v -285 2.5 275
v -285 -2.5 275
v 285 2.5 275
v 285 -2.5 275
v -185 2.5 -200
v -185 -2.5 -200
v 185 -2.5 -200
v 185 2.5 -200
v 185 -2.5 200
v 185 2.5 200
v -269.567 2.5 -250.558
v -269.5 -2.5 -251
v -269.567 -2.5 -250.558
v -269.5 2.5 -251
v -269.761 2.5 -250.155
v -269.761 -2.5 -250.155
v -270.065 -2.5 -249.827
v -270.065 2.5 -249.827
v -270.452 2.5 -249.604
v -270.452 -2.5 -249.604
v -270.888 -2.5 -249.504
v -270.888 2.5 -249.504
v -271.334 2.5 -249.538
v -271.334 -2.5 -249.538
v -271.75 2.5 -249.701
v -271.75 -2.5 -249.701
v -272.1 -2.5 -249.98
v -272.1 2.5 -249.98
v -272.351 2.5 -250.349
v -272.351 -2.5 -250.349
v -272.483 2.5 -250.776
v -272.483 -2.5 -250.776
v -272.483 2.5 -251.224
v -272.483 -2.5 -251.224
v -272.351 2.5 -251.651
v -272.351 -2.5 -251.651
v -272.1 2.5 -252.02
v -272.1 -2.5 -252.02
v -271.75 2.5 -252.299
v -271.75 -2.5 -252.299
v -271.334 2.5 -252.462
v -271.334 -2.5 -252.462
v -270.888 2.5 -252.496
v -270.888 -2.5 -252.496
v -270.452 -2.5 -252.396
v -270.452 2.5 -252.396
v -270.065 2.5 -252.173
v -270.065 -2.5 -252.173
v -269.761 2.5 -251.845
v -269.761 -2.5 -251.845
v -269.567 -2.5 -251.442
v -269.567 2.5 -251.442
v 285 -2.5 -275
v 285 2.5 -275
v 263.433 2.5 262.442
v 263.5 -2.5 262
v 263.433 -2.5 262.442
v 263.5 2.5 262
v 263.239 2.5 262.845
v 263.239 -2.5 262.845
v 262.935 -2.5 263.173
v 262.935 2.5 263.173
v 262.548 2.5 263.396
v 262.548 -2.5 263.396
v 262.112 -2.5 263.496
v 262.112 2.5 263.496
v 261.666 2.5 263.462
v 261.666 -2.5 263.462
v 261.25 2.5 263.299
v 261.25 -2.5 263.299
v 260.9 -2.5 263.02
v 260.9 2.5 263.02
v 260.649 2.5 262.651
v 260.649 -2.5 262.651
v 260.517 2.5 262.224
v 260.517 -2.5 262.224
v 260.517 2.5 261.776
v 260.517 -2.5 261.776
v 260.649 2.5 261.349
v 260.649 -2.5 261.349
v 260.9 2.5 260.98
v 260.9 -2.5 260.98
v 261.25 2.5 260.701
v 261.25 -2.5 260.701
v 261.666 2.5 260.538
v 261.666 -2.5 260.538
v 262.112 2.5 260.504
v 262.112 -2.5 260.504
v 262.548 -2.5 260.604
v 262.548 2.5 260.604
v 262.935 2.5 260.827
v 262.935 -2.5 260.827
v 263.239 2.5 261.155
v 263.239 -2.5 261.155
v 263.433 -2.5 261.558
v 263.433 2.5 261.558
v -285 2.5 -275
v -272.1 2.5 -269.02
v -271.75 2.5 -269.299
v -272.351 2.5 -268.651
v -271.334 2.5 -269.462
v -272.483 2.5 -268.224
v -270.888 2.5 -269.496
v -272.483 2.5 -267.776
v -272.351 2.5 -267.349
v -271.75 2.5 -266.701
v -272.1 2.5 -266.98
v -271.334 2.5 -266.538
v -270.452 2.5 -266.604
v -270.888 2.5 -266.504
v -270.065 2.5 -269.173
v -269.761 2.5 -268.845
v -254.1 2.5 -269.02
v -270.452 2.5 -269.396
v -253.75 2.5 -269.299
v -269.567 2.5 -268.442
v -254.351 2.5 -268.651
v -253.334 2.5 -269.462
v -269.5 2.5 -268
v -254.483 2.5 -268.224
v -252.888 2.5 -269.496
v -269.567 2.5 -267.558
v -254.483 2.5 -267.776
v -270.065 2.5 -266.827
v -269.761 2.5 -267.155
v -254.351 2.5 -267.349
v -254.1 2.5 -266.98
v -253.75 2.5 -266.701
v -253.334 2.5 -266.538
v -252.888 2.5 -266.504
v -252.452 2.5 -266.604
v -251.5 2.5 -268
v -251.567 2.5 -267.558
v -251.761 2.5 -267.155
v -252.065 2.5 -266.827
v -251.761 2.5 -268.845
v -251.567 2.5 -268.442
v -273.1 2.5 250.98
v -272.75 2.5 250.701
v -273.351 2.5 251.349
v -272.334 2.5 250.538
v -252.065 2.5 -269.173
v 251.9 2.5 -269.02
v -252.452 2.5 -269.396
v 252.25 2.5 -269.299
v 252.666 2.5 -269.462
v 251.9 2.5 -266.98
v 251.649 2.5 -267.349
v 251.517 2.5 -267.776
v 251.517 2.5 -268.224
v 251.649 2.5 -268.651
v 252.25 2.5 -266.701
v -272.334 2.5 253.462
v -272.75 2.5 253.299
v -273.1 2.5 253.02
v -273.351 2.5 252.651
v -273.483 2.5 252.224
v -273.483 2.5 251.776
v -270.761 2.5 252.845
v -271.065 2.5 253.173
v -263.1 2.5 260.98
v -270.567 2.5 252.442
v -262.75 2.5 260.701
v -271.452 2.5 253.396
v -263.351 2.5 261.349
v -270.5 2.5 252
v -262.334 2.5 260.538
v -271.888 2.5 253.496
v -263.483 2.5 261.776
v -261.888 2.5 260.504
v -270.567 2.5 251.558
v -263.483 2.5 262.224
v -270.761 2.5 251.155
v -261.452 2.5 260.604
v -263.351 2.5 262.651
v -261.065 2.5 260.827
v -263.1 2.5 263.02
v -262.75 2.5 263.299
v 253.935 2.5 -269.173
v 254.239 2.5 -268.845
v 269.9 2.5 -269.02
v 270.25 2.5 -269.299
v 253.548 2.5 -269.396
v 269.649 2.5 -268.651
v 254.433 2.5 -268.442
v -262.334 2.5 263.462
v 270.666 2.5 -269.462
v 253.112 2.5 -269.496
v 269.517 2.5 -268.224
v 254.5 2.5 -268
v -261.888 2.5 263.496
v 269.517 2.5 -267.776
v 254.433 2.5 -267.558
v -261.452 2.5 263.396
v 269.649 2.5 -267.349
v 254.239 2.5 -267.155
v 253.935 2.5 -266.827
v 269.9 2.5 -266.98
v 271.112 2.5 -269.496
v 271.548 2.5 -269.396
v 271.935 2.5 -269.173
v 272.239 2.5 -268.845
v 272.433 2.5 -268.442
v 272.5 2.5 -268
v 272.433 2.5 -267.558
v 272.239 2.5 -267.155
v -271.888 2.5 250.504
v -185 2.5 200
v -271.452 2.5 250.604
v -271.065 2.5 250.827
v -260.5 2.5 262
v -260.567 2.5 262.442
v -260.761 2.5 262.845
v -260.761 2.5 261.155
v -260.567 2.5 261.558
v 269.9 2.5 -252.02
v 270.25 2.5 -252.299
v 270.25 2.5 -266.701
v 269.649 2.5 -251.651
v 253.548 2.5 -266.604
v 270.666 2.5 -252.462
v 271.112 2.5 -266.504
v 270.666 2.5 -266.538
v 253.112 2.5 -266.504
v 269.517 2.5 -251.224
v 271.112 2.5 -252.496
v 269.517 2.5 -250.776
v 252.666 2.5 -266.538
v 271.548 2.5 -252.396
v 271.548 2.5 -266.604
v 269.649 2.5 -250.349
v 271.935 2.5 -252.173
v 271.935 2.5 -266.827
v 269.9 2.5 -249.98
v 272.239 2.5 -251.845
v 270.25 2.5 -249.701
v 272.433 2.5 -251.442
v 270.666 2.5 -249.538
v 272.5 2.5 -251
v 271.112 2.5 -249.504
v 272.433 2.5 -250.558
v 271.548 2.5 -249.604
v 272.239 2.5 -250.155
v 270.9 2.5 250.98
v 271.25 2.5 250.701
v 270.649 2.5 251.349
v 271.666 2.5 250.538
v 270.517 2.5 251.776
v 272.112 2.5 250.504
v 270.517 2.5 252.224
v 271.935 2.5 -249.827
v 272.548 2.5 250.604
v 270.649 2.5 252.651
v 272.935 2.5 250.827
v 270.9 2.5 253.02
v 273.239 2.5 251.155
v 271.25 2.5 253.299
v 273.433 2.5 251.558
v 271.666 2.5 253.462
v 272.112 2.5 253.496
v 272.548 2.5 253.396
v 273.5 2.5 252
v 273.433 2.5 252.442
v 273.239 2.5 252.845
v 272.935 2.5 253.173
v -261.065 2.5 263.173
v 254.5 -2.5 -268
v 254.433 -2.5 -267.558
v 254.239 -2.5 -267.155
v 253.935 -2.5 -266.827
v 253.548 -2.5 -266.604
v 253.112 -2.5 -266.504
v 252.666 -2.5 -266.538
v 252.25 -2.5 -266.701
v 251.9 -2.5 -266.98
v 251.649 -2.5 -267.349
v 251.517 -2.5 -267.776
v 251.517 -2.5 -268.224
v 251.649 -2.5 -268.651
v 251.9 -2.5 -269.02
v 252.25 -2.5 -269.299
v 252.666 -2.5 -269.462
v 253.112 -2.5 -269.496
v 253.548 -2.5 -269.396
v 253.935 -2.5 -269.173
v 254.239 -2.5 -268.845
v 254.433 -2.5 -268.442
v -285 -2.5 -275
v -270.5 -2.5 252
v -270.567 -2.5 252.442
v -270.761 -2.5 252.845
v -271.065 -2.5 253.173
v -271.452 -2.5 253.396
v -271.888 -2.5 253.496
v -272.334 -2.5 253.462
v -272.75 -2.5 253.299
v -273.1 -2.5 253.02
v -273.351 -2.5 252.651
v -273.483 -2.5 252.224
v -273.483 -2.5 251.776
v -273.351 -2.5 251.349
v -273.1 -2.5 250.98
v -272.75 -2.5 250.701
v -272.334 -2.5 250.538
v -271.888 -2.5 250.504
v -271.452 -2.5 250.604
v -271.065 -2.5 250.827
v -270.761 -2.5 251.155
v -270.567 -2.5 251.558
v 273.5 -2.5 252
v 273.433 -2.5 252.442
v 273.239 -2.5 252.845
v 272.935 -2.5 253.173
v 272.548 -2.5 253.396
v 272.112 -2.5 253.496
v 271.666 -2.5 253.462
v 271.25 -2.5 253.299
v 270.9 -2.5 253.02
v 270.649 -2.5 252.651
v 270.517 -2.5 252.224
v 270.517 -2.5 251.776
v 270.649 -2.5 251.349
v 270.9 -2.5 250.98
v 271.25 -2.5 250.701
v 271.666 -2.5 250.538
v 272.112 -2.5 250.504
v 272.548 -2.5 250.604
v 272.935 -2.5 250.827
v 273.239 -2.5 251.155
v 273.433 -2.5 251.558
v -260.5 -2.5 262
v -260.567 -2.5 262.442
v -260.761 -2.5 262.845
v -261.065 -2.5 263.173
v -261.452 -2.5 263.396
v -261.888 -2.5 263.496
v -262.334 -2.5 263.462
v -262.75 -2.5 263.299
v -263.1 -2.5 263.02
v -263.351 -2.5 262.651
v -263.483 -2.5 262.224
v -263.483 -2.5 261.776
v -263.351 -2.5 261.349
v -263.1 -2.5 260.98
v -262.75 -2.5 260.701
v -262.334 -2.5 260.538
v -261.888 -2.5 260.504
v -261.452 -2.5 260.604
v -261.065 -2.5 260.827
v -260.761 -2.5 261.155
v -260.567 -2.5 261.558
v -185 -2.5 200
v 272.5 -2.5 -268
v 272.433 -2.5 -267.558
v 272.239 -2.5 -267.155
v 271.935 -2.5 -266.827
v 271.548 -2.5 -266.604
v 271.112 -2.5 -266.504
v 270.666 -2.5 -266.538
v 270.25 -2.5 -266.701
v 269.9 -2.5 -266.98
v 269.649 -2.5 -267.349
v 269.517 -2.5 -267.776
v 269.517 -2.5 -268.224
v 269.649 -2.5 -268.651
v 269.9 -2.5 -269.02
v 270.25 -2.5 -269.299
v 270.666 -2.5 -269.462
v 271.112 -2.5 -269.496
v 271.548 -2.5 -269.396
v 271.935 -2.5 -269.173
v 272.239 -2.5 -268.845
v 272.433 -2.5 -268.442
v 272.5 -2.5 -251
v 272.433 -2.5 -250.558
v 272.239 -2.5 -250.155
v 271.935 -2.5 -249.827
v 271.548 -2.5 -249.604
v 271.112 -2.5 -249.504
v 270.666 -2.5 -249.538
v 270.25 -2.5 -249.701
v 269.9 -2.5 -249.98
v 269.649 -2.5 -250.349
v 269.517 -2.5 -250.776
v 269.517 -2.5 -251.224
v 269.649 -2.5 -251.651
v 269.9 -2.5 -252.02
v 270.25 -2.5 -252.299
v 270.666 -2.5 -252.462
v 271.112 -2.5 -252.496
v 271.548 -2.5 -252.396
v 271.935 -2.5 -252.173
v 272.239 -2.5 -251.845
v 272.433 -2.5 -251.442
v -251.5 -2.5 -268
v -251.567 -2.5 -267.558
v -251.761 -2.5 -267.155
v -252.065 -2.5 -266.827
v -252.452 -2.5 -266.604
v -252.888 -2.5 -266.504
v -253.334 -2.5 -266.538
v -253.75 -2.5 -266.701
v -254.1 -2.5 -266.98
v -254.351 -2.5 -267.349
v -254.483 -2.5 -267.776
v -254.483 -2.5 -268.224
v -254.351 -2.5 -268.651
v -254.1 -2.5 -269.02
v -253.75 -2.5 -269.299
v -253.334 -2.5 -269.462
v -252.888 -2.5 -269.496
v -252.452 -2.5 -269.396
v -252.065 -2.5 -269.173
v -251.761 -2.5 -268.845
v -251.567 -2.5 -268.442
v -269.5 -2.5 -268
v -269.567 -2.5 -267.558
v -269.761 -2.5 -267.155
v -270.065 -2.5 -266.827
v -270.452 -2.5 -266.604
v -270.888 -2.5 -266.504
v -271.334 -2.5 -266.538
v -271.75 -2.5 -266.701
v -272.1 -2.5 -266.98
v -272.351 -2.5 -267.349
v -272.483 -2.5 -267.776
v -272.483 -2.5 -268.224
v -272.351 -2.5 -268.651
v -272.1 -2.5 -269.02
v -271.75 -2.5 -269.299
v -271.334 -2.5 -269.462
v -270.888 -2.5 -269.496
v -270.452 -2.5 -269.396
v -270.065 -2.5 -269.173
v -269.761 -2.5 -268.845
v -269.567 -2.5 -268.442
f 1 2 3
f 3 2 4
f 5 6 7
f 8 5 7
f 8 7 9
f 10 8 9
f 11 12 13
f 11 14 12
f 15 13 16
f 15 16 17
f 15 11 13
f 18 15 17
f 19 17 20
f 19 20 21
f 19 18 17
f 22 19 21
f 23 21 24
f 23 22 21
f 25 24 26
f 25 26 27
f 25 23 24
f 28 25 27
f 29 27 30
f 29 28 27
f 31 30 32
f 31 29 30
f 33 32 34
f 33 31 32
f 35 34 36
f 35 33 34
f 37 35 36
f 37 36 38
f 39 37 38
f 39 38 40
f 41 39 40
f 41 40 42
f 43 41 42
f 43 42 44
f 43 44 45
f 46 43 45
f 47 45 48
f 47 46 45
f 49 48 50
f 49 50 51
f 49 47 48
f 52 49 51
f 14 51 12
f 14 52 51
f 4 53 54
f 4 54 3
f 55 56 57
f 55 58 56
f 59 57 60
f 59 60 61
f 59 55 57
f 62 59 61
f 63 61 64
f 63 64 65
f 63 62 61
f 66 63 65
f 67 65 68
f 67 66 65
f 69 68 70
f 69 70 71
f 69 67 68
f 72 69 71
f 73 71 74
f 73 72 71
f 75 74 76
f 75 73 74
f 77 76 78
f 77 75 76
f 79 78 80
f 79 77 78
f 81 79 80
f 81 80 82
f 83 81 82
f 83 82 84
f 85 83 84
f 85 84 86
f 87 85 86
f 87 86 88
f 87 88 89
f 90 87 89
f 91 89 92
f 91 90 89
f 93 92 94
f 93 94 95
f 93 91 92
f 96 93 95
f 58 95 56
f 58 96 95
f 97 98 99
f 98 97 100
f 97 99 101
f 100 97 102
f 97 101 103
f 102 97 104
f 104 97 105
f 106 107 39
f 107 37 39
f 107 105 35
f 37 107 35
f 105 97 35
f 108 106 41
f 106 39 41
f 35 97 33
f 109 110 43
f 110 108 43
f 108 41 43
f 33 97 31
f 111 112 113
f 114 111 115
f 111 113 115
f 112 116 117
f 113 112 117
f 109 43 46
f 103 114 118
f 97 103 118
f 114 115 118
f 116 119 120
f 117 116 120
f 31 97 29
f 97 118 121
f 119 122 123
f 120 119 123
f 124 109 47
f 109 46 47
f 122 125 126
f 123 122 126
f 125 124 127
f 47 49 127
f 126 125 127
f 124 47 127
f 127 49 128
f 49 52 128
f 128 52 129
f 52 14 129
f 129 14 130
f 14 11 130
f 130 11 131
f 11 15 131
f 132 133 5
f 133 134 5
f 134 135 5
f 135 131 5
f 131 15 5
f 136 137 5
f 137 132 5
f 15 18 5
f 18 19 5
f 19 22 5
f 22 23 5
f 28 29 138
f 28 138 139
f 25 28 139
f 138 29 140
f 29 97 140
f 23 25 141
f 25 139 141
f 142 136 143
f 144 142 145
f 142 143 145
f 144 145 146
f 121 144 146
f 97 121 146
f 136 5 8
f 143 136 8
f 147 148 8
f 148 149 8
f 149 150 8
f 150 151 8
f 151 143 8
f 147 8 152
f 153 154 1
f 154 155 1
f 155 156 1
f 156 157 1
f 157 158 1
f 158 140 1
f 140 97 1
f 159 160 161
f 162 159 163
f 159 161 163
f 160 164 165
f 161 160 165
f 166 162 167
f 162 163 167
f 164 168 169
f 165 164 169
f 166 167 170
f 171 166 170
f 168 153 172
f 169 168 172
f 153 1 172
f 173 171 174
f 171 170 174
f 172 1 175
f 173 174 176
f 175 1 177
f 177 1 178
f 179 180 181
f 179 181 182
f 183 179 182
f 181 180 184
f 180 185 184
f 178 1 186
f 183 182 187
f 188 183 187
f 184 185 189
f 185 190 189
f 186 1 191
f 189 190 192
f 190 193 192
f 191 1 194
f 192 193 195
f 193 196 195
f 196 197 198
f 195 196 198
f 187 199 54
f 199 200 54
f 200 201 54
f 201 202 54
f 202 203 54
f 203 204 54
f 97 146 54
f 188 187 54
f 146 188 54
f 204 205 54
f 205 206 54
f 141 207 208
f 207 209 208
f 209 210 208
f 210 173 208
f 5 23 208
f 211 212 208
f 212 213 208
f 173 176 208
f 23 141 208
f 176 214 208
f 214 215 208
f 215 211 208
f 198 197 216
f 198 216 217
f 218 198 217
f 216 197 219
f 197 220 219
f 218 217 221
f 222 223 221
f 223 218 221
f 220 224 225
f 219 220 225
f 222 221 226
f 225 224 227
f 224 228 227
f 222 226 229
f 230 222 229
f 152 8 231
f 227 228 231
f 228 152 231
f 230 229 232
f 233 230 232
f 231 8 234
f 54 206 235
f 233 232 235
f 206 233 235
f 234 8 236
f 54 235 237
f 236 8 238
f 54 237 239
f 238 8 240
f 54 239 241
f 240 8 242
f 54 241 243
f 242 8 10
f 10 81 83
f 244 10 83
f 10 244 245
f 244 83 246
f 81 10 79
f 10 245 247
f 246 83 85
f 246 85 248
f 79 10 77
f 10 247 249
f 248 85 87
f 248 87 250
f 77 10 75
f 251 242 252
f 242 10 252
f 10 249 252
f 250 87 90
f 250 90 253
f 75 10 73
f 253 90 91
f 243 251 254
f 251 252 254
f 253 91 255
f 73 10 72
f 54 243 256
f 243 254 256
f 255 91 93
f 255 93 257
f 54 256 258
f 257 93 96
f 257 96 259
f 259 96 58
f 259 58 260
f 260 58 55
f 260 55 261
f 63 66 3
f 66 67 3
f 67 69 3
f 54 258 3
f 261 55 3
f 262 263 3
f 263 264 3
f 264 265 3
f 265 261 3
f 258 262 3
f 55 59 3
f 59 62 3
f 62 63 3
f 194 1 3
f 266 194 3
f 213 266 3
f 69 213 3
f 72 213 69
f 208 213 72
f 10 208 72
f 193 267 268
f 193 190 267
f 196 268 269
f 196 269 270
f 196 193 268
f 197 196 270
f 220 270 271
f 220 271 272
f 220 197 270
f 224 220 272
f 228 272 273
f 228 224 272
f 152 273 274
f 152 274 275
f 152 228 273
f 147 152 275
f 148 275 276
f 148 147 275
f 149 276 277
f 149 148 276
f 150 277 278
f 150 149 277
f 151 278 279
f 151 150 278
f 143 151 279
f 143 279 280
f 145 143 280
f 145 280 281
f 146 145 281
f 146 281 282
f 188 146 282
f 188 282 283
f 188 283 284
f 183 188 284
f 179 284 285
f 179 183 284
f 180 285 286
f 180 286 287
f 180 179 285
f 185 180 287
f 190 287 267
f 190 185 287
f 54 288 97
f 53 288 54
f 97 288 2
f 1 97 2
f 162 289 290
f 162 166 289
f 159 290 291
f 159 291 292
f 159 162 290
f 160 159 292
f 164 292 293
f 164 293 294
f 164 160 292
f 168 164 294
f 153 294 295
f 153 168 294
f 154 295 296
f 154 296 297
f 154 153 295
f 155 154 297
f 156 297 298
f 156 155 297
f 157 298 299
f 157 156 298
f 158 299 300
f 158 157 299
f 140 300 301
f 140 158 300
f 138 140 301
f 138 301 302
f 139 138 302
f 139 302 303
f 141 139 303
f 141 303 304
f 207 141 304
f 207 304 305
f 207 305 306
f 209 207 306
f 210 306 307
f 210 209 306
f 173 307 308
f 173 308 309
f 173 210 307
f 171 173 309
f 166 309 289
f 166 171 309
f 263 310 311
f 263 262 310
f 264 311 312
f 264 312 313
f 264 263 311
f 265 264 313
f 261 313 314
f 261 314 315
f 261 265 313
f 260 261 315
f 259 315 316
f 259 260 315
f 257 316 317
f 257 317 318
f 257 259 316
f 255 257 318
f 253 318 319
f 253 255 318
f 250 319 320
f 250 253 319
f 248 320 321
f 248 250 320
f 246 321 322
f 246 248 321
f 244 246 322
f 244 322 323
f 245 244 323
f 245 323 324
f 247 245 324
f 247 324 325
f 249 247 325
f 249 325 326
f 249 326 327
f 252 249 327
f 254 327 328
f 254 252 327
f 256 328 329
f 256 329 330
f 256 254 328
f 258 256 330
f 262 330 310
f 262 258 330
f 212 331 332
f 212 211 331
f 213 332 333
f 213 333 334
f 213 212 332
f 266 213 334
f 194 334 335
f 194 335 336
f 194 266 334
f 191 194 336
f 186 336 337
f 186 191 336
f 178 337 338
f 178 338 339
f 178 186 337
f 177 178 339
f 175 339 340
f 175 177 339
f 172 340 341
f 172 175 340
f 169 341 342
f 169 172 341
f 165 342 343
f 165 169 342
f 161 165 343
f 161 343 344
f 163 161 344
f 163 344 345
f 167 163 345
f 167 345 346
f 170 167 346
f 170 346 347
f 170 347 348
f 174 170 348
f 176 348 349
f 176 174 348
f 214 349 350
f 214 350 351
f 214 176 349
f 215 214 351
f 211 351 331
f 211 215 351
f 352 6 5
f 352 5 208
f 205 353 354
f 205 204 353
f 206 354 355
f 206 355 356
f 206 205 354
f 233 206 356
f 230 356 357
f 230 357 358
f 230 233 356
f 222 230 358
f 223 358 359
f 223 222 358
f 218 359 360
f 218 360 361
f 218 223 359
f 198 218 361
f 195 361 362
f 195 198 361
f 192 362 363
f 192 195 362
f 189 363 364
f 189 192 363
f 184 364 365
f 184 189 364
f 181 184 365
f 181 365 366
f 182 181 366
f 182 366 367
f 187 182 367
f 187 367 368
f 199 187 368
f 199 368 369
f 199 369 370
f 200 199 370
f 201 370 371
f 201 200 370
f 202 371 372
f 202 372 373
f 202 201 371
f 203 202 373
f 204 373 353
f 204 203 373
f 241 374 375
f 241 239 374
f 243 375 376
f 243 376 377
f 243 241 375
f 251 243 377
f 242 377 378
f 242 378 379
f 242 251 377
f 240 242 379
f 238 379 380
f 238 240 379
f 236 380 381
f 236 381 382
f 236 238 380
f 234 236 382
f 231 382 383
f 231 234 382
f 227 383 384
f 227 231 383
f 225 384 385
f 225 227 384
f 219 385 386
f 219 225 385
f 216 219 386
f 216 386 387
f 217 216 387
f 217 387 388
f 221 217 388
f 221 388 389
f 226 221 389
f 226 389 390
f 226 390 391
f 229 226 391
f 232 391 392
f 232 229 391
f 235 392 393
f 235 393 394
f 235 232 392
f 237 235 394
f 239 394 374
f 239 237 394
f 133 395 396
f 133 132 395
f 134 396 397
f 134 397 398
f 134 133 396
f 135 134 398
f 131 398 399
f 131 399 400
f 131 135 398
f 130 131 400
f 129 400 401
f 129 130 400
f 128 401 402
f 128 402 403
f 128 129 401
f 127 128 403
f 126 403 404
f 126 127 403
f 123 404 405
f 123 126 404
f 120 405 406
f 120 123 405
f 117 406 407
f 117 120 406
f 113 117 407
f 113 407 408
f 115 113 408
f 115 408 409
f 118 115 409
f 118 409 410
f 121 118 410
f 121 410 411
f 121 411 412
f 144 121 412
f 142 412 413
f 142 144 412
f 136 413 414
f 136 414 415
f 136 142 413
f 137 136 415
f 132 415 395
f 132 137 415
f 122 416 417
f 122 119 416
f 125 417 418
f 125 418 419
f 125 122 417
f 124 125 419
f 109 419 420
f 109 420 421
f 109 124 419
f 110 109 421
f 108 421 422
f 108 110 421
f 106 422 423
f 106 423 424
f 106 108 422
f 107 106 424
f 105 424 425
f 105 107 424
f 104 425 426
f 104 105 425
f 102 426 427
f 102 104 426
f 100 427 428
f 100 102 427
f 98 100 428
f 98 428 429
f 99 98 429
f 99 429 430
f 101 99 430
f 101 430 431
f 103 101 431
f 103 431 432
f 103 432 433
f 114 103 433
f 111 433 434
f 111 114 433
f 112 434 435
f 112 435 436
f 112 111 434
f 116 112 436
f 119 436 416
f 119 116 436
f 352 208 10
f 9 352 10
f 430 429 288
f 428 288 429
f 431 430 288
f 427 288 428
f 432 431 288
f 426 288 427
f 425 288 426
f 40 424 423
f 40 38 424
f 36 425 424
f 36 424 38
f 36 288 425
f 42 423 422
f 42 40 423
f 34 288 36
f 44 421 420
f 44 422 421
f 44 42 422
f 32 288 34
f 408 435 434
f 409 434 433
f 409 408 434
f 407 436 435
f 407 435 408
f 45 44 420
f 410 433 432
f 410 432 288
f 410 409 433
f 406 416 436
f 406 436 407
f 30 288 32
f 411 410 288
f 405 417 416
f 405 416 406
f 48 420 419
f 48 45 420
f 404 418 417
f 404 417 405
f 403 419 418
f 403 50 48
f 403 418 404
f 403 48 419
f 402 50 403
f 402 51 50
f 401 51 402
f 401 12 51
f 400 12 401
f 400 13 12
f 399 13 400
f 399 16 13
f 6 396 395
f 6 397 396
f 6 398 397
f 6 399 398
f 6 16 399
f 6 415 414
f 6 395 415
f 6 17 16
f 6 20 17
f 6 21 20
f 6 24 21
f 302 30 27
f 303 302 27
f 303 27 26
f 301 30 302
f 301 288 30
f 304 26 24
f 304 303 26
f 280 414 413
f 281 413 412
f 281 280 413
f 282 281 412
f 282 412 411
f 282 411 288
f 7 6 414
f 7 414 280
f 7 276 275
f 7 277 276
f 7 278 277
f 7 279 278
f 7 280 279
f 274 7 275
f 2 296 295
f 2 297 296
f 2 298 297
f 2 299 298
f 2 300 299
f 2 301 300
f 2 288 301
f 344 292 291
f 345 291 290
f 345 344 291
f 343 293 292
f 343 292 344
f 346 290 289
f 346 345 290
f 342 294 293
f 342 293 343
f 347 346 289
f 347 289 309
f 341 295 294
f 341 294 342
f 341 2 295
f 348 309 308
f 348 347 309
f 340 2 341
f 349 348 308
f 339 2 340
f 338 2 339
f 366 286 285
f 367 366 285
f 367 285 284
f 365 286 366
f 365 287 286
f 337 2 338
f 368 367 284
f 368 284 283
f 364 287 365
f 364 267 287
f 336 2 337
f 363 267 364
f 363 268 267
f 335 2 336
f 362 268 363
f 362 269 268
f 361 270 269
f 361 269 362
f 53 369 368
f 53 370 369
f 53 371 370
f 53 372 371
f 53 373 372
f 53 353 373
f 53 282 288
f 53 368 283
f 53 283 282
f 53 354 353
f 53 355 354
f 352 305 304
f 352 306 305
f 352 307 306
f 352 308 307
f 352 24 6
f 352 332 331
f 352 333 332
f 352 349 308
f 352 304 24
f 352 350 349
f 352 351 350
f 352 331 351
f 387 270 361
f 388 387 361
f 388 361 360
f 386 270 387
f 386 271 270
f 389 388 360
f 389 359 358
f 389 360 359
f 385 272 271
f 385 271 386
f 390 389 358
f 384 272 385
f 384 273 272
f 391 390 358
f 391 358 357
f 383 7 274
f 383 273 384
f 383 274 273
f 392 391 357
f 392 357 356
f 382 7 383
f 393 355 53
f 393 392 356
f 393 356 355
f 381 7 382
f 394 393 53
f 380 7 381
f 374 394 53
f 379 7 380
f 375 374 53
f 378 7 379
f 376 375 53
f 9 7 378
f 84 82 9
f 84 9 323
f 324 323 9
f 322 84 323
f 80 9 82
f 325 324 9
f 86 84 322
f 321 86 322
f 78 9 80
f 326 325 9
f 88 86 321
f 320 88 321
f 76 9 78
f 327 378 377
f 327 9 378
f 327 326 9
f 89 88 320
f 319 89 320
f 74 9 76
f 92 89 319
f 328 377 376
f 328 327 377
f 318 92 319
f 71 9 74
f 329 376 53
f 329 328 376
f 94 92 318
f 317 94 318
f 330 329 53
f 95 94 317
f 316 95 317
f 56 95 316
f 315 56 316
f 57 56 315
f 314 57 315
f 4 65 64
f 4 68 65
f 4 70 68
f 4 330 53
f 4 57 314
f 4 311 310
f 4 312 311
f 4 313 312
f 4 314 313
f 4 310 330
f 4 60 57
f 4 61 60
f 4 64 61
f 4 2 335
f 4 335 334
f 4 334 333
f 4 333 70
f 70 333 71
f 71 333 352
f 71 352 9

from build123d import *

# Parameters (mm, degrees)
F0_W     = 570
F0_H     = 550
F0_R     = 1.5
F0_W_2   = 370
F0_H_2   = 400
F1_DEPTH = 2.5


with BuildPart() as f1:
    # F0 (on Front) → F1 (new body, symmetric)
    with BuildSketch(Plane.XZ):
        Rectangle(F0_W, F0_H)
        with Locations((-271, -268)):
            Circle(F0_R, mode=Mode.SUBTRACT)
        with Locations((-253, -268)):
            Circle(F0_R, mode=Mode.SUBTRACT)
        with Locations((-271, -251)):
            Circle(F0_R, mode=Mode.SUBTRACT)
        with Locations((253, -268)):
            Circle(F0_R, mode=Mode.SUBTRACT)
        with Locations((271, -268)):
            Circle(F0_R, mode=Mode.SUBTRACT)
        with Locations((271, -251)):
            Circle(F0_R, mode=Mode.SUBTRACT)
        with Locations((-272, 252)):
            Circle(F0_R, mode=Mode.SUBTRACT)
        with Locations((-262, 262)):
            Circle(F0_R, mode=Mode.SUBTRACT)
        Rectangle(F0_W_2, F0_H_2, mode=Mode.SUBTRACT)
        with Locations((272, 252)):
            Circle(F0_R, mode=Mode.SUBTRACT)
        with Locations((262, 262)):
            Circle(F0_R, mode=Mode.SUBTRACT)
    extrude(amount=F1_DEPTH, both=True)


solid = f1.part
